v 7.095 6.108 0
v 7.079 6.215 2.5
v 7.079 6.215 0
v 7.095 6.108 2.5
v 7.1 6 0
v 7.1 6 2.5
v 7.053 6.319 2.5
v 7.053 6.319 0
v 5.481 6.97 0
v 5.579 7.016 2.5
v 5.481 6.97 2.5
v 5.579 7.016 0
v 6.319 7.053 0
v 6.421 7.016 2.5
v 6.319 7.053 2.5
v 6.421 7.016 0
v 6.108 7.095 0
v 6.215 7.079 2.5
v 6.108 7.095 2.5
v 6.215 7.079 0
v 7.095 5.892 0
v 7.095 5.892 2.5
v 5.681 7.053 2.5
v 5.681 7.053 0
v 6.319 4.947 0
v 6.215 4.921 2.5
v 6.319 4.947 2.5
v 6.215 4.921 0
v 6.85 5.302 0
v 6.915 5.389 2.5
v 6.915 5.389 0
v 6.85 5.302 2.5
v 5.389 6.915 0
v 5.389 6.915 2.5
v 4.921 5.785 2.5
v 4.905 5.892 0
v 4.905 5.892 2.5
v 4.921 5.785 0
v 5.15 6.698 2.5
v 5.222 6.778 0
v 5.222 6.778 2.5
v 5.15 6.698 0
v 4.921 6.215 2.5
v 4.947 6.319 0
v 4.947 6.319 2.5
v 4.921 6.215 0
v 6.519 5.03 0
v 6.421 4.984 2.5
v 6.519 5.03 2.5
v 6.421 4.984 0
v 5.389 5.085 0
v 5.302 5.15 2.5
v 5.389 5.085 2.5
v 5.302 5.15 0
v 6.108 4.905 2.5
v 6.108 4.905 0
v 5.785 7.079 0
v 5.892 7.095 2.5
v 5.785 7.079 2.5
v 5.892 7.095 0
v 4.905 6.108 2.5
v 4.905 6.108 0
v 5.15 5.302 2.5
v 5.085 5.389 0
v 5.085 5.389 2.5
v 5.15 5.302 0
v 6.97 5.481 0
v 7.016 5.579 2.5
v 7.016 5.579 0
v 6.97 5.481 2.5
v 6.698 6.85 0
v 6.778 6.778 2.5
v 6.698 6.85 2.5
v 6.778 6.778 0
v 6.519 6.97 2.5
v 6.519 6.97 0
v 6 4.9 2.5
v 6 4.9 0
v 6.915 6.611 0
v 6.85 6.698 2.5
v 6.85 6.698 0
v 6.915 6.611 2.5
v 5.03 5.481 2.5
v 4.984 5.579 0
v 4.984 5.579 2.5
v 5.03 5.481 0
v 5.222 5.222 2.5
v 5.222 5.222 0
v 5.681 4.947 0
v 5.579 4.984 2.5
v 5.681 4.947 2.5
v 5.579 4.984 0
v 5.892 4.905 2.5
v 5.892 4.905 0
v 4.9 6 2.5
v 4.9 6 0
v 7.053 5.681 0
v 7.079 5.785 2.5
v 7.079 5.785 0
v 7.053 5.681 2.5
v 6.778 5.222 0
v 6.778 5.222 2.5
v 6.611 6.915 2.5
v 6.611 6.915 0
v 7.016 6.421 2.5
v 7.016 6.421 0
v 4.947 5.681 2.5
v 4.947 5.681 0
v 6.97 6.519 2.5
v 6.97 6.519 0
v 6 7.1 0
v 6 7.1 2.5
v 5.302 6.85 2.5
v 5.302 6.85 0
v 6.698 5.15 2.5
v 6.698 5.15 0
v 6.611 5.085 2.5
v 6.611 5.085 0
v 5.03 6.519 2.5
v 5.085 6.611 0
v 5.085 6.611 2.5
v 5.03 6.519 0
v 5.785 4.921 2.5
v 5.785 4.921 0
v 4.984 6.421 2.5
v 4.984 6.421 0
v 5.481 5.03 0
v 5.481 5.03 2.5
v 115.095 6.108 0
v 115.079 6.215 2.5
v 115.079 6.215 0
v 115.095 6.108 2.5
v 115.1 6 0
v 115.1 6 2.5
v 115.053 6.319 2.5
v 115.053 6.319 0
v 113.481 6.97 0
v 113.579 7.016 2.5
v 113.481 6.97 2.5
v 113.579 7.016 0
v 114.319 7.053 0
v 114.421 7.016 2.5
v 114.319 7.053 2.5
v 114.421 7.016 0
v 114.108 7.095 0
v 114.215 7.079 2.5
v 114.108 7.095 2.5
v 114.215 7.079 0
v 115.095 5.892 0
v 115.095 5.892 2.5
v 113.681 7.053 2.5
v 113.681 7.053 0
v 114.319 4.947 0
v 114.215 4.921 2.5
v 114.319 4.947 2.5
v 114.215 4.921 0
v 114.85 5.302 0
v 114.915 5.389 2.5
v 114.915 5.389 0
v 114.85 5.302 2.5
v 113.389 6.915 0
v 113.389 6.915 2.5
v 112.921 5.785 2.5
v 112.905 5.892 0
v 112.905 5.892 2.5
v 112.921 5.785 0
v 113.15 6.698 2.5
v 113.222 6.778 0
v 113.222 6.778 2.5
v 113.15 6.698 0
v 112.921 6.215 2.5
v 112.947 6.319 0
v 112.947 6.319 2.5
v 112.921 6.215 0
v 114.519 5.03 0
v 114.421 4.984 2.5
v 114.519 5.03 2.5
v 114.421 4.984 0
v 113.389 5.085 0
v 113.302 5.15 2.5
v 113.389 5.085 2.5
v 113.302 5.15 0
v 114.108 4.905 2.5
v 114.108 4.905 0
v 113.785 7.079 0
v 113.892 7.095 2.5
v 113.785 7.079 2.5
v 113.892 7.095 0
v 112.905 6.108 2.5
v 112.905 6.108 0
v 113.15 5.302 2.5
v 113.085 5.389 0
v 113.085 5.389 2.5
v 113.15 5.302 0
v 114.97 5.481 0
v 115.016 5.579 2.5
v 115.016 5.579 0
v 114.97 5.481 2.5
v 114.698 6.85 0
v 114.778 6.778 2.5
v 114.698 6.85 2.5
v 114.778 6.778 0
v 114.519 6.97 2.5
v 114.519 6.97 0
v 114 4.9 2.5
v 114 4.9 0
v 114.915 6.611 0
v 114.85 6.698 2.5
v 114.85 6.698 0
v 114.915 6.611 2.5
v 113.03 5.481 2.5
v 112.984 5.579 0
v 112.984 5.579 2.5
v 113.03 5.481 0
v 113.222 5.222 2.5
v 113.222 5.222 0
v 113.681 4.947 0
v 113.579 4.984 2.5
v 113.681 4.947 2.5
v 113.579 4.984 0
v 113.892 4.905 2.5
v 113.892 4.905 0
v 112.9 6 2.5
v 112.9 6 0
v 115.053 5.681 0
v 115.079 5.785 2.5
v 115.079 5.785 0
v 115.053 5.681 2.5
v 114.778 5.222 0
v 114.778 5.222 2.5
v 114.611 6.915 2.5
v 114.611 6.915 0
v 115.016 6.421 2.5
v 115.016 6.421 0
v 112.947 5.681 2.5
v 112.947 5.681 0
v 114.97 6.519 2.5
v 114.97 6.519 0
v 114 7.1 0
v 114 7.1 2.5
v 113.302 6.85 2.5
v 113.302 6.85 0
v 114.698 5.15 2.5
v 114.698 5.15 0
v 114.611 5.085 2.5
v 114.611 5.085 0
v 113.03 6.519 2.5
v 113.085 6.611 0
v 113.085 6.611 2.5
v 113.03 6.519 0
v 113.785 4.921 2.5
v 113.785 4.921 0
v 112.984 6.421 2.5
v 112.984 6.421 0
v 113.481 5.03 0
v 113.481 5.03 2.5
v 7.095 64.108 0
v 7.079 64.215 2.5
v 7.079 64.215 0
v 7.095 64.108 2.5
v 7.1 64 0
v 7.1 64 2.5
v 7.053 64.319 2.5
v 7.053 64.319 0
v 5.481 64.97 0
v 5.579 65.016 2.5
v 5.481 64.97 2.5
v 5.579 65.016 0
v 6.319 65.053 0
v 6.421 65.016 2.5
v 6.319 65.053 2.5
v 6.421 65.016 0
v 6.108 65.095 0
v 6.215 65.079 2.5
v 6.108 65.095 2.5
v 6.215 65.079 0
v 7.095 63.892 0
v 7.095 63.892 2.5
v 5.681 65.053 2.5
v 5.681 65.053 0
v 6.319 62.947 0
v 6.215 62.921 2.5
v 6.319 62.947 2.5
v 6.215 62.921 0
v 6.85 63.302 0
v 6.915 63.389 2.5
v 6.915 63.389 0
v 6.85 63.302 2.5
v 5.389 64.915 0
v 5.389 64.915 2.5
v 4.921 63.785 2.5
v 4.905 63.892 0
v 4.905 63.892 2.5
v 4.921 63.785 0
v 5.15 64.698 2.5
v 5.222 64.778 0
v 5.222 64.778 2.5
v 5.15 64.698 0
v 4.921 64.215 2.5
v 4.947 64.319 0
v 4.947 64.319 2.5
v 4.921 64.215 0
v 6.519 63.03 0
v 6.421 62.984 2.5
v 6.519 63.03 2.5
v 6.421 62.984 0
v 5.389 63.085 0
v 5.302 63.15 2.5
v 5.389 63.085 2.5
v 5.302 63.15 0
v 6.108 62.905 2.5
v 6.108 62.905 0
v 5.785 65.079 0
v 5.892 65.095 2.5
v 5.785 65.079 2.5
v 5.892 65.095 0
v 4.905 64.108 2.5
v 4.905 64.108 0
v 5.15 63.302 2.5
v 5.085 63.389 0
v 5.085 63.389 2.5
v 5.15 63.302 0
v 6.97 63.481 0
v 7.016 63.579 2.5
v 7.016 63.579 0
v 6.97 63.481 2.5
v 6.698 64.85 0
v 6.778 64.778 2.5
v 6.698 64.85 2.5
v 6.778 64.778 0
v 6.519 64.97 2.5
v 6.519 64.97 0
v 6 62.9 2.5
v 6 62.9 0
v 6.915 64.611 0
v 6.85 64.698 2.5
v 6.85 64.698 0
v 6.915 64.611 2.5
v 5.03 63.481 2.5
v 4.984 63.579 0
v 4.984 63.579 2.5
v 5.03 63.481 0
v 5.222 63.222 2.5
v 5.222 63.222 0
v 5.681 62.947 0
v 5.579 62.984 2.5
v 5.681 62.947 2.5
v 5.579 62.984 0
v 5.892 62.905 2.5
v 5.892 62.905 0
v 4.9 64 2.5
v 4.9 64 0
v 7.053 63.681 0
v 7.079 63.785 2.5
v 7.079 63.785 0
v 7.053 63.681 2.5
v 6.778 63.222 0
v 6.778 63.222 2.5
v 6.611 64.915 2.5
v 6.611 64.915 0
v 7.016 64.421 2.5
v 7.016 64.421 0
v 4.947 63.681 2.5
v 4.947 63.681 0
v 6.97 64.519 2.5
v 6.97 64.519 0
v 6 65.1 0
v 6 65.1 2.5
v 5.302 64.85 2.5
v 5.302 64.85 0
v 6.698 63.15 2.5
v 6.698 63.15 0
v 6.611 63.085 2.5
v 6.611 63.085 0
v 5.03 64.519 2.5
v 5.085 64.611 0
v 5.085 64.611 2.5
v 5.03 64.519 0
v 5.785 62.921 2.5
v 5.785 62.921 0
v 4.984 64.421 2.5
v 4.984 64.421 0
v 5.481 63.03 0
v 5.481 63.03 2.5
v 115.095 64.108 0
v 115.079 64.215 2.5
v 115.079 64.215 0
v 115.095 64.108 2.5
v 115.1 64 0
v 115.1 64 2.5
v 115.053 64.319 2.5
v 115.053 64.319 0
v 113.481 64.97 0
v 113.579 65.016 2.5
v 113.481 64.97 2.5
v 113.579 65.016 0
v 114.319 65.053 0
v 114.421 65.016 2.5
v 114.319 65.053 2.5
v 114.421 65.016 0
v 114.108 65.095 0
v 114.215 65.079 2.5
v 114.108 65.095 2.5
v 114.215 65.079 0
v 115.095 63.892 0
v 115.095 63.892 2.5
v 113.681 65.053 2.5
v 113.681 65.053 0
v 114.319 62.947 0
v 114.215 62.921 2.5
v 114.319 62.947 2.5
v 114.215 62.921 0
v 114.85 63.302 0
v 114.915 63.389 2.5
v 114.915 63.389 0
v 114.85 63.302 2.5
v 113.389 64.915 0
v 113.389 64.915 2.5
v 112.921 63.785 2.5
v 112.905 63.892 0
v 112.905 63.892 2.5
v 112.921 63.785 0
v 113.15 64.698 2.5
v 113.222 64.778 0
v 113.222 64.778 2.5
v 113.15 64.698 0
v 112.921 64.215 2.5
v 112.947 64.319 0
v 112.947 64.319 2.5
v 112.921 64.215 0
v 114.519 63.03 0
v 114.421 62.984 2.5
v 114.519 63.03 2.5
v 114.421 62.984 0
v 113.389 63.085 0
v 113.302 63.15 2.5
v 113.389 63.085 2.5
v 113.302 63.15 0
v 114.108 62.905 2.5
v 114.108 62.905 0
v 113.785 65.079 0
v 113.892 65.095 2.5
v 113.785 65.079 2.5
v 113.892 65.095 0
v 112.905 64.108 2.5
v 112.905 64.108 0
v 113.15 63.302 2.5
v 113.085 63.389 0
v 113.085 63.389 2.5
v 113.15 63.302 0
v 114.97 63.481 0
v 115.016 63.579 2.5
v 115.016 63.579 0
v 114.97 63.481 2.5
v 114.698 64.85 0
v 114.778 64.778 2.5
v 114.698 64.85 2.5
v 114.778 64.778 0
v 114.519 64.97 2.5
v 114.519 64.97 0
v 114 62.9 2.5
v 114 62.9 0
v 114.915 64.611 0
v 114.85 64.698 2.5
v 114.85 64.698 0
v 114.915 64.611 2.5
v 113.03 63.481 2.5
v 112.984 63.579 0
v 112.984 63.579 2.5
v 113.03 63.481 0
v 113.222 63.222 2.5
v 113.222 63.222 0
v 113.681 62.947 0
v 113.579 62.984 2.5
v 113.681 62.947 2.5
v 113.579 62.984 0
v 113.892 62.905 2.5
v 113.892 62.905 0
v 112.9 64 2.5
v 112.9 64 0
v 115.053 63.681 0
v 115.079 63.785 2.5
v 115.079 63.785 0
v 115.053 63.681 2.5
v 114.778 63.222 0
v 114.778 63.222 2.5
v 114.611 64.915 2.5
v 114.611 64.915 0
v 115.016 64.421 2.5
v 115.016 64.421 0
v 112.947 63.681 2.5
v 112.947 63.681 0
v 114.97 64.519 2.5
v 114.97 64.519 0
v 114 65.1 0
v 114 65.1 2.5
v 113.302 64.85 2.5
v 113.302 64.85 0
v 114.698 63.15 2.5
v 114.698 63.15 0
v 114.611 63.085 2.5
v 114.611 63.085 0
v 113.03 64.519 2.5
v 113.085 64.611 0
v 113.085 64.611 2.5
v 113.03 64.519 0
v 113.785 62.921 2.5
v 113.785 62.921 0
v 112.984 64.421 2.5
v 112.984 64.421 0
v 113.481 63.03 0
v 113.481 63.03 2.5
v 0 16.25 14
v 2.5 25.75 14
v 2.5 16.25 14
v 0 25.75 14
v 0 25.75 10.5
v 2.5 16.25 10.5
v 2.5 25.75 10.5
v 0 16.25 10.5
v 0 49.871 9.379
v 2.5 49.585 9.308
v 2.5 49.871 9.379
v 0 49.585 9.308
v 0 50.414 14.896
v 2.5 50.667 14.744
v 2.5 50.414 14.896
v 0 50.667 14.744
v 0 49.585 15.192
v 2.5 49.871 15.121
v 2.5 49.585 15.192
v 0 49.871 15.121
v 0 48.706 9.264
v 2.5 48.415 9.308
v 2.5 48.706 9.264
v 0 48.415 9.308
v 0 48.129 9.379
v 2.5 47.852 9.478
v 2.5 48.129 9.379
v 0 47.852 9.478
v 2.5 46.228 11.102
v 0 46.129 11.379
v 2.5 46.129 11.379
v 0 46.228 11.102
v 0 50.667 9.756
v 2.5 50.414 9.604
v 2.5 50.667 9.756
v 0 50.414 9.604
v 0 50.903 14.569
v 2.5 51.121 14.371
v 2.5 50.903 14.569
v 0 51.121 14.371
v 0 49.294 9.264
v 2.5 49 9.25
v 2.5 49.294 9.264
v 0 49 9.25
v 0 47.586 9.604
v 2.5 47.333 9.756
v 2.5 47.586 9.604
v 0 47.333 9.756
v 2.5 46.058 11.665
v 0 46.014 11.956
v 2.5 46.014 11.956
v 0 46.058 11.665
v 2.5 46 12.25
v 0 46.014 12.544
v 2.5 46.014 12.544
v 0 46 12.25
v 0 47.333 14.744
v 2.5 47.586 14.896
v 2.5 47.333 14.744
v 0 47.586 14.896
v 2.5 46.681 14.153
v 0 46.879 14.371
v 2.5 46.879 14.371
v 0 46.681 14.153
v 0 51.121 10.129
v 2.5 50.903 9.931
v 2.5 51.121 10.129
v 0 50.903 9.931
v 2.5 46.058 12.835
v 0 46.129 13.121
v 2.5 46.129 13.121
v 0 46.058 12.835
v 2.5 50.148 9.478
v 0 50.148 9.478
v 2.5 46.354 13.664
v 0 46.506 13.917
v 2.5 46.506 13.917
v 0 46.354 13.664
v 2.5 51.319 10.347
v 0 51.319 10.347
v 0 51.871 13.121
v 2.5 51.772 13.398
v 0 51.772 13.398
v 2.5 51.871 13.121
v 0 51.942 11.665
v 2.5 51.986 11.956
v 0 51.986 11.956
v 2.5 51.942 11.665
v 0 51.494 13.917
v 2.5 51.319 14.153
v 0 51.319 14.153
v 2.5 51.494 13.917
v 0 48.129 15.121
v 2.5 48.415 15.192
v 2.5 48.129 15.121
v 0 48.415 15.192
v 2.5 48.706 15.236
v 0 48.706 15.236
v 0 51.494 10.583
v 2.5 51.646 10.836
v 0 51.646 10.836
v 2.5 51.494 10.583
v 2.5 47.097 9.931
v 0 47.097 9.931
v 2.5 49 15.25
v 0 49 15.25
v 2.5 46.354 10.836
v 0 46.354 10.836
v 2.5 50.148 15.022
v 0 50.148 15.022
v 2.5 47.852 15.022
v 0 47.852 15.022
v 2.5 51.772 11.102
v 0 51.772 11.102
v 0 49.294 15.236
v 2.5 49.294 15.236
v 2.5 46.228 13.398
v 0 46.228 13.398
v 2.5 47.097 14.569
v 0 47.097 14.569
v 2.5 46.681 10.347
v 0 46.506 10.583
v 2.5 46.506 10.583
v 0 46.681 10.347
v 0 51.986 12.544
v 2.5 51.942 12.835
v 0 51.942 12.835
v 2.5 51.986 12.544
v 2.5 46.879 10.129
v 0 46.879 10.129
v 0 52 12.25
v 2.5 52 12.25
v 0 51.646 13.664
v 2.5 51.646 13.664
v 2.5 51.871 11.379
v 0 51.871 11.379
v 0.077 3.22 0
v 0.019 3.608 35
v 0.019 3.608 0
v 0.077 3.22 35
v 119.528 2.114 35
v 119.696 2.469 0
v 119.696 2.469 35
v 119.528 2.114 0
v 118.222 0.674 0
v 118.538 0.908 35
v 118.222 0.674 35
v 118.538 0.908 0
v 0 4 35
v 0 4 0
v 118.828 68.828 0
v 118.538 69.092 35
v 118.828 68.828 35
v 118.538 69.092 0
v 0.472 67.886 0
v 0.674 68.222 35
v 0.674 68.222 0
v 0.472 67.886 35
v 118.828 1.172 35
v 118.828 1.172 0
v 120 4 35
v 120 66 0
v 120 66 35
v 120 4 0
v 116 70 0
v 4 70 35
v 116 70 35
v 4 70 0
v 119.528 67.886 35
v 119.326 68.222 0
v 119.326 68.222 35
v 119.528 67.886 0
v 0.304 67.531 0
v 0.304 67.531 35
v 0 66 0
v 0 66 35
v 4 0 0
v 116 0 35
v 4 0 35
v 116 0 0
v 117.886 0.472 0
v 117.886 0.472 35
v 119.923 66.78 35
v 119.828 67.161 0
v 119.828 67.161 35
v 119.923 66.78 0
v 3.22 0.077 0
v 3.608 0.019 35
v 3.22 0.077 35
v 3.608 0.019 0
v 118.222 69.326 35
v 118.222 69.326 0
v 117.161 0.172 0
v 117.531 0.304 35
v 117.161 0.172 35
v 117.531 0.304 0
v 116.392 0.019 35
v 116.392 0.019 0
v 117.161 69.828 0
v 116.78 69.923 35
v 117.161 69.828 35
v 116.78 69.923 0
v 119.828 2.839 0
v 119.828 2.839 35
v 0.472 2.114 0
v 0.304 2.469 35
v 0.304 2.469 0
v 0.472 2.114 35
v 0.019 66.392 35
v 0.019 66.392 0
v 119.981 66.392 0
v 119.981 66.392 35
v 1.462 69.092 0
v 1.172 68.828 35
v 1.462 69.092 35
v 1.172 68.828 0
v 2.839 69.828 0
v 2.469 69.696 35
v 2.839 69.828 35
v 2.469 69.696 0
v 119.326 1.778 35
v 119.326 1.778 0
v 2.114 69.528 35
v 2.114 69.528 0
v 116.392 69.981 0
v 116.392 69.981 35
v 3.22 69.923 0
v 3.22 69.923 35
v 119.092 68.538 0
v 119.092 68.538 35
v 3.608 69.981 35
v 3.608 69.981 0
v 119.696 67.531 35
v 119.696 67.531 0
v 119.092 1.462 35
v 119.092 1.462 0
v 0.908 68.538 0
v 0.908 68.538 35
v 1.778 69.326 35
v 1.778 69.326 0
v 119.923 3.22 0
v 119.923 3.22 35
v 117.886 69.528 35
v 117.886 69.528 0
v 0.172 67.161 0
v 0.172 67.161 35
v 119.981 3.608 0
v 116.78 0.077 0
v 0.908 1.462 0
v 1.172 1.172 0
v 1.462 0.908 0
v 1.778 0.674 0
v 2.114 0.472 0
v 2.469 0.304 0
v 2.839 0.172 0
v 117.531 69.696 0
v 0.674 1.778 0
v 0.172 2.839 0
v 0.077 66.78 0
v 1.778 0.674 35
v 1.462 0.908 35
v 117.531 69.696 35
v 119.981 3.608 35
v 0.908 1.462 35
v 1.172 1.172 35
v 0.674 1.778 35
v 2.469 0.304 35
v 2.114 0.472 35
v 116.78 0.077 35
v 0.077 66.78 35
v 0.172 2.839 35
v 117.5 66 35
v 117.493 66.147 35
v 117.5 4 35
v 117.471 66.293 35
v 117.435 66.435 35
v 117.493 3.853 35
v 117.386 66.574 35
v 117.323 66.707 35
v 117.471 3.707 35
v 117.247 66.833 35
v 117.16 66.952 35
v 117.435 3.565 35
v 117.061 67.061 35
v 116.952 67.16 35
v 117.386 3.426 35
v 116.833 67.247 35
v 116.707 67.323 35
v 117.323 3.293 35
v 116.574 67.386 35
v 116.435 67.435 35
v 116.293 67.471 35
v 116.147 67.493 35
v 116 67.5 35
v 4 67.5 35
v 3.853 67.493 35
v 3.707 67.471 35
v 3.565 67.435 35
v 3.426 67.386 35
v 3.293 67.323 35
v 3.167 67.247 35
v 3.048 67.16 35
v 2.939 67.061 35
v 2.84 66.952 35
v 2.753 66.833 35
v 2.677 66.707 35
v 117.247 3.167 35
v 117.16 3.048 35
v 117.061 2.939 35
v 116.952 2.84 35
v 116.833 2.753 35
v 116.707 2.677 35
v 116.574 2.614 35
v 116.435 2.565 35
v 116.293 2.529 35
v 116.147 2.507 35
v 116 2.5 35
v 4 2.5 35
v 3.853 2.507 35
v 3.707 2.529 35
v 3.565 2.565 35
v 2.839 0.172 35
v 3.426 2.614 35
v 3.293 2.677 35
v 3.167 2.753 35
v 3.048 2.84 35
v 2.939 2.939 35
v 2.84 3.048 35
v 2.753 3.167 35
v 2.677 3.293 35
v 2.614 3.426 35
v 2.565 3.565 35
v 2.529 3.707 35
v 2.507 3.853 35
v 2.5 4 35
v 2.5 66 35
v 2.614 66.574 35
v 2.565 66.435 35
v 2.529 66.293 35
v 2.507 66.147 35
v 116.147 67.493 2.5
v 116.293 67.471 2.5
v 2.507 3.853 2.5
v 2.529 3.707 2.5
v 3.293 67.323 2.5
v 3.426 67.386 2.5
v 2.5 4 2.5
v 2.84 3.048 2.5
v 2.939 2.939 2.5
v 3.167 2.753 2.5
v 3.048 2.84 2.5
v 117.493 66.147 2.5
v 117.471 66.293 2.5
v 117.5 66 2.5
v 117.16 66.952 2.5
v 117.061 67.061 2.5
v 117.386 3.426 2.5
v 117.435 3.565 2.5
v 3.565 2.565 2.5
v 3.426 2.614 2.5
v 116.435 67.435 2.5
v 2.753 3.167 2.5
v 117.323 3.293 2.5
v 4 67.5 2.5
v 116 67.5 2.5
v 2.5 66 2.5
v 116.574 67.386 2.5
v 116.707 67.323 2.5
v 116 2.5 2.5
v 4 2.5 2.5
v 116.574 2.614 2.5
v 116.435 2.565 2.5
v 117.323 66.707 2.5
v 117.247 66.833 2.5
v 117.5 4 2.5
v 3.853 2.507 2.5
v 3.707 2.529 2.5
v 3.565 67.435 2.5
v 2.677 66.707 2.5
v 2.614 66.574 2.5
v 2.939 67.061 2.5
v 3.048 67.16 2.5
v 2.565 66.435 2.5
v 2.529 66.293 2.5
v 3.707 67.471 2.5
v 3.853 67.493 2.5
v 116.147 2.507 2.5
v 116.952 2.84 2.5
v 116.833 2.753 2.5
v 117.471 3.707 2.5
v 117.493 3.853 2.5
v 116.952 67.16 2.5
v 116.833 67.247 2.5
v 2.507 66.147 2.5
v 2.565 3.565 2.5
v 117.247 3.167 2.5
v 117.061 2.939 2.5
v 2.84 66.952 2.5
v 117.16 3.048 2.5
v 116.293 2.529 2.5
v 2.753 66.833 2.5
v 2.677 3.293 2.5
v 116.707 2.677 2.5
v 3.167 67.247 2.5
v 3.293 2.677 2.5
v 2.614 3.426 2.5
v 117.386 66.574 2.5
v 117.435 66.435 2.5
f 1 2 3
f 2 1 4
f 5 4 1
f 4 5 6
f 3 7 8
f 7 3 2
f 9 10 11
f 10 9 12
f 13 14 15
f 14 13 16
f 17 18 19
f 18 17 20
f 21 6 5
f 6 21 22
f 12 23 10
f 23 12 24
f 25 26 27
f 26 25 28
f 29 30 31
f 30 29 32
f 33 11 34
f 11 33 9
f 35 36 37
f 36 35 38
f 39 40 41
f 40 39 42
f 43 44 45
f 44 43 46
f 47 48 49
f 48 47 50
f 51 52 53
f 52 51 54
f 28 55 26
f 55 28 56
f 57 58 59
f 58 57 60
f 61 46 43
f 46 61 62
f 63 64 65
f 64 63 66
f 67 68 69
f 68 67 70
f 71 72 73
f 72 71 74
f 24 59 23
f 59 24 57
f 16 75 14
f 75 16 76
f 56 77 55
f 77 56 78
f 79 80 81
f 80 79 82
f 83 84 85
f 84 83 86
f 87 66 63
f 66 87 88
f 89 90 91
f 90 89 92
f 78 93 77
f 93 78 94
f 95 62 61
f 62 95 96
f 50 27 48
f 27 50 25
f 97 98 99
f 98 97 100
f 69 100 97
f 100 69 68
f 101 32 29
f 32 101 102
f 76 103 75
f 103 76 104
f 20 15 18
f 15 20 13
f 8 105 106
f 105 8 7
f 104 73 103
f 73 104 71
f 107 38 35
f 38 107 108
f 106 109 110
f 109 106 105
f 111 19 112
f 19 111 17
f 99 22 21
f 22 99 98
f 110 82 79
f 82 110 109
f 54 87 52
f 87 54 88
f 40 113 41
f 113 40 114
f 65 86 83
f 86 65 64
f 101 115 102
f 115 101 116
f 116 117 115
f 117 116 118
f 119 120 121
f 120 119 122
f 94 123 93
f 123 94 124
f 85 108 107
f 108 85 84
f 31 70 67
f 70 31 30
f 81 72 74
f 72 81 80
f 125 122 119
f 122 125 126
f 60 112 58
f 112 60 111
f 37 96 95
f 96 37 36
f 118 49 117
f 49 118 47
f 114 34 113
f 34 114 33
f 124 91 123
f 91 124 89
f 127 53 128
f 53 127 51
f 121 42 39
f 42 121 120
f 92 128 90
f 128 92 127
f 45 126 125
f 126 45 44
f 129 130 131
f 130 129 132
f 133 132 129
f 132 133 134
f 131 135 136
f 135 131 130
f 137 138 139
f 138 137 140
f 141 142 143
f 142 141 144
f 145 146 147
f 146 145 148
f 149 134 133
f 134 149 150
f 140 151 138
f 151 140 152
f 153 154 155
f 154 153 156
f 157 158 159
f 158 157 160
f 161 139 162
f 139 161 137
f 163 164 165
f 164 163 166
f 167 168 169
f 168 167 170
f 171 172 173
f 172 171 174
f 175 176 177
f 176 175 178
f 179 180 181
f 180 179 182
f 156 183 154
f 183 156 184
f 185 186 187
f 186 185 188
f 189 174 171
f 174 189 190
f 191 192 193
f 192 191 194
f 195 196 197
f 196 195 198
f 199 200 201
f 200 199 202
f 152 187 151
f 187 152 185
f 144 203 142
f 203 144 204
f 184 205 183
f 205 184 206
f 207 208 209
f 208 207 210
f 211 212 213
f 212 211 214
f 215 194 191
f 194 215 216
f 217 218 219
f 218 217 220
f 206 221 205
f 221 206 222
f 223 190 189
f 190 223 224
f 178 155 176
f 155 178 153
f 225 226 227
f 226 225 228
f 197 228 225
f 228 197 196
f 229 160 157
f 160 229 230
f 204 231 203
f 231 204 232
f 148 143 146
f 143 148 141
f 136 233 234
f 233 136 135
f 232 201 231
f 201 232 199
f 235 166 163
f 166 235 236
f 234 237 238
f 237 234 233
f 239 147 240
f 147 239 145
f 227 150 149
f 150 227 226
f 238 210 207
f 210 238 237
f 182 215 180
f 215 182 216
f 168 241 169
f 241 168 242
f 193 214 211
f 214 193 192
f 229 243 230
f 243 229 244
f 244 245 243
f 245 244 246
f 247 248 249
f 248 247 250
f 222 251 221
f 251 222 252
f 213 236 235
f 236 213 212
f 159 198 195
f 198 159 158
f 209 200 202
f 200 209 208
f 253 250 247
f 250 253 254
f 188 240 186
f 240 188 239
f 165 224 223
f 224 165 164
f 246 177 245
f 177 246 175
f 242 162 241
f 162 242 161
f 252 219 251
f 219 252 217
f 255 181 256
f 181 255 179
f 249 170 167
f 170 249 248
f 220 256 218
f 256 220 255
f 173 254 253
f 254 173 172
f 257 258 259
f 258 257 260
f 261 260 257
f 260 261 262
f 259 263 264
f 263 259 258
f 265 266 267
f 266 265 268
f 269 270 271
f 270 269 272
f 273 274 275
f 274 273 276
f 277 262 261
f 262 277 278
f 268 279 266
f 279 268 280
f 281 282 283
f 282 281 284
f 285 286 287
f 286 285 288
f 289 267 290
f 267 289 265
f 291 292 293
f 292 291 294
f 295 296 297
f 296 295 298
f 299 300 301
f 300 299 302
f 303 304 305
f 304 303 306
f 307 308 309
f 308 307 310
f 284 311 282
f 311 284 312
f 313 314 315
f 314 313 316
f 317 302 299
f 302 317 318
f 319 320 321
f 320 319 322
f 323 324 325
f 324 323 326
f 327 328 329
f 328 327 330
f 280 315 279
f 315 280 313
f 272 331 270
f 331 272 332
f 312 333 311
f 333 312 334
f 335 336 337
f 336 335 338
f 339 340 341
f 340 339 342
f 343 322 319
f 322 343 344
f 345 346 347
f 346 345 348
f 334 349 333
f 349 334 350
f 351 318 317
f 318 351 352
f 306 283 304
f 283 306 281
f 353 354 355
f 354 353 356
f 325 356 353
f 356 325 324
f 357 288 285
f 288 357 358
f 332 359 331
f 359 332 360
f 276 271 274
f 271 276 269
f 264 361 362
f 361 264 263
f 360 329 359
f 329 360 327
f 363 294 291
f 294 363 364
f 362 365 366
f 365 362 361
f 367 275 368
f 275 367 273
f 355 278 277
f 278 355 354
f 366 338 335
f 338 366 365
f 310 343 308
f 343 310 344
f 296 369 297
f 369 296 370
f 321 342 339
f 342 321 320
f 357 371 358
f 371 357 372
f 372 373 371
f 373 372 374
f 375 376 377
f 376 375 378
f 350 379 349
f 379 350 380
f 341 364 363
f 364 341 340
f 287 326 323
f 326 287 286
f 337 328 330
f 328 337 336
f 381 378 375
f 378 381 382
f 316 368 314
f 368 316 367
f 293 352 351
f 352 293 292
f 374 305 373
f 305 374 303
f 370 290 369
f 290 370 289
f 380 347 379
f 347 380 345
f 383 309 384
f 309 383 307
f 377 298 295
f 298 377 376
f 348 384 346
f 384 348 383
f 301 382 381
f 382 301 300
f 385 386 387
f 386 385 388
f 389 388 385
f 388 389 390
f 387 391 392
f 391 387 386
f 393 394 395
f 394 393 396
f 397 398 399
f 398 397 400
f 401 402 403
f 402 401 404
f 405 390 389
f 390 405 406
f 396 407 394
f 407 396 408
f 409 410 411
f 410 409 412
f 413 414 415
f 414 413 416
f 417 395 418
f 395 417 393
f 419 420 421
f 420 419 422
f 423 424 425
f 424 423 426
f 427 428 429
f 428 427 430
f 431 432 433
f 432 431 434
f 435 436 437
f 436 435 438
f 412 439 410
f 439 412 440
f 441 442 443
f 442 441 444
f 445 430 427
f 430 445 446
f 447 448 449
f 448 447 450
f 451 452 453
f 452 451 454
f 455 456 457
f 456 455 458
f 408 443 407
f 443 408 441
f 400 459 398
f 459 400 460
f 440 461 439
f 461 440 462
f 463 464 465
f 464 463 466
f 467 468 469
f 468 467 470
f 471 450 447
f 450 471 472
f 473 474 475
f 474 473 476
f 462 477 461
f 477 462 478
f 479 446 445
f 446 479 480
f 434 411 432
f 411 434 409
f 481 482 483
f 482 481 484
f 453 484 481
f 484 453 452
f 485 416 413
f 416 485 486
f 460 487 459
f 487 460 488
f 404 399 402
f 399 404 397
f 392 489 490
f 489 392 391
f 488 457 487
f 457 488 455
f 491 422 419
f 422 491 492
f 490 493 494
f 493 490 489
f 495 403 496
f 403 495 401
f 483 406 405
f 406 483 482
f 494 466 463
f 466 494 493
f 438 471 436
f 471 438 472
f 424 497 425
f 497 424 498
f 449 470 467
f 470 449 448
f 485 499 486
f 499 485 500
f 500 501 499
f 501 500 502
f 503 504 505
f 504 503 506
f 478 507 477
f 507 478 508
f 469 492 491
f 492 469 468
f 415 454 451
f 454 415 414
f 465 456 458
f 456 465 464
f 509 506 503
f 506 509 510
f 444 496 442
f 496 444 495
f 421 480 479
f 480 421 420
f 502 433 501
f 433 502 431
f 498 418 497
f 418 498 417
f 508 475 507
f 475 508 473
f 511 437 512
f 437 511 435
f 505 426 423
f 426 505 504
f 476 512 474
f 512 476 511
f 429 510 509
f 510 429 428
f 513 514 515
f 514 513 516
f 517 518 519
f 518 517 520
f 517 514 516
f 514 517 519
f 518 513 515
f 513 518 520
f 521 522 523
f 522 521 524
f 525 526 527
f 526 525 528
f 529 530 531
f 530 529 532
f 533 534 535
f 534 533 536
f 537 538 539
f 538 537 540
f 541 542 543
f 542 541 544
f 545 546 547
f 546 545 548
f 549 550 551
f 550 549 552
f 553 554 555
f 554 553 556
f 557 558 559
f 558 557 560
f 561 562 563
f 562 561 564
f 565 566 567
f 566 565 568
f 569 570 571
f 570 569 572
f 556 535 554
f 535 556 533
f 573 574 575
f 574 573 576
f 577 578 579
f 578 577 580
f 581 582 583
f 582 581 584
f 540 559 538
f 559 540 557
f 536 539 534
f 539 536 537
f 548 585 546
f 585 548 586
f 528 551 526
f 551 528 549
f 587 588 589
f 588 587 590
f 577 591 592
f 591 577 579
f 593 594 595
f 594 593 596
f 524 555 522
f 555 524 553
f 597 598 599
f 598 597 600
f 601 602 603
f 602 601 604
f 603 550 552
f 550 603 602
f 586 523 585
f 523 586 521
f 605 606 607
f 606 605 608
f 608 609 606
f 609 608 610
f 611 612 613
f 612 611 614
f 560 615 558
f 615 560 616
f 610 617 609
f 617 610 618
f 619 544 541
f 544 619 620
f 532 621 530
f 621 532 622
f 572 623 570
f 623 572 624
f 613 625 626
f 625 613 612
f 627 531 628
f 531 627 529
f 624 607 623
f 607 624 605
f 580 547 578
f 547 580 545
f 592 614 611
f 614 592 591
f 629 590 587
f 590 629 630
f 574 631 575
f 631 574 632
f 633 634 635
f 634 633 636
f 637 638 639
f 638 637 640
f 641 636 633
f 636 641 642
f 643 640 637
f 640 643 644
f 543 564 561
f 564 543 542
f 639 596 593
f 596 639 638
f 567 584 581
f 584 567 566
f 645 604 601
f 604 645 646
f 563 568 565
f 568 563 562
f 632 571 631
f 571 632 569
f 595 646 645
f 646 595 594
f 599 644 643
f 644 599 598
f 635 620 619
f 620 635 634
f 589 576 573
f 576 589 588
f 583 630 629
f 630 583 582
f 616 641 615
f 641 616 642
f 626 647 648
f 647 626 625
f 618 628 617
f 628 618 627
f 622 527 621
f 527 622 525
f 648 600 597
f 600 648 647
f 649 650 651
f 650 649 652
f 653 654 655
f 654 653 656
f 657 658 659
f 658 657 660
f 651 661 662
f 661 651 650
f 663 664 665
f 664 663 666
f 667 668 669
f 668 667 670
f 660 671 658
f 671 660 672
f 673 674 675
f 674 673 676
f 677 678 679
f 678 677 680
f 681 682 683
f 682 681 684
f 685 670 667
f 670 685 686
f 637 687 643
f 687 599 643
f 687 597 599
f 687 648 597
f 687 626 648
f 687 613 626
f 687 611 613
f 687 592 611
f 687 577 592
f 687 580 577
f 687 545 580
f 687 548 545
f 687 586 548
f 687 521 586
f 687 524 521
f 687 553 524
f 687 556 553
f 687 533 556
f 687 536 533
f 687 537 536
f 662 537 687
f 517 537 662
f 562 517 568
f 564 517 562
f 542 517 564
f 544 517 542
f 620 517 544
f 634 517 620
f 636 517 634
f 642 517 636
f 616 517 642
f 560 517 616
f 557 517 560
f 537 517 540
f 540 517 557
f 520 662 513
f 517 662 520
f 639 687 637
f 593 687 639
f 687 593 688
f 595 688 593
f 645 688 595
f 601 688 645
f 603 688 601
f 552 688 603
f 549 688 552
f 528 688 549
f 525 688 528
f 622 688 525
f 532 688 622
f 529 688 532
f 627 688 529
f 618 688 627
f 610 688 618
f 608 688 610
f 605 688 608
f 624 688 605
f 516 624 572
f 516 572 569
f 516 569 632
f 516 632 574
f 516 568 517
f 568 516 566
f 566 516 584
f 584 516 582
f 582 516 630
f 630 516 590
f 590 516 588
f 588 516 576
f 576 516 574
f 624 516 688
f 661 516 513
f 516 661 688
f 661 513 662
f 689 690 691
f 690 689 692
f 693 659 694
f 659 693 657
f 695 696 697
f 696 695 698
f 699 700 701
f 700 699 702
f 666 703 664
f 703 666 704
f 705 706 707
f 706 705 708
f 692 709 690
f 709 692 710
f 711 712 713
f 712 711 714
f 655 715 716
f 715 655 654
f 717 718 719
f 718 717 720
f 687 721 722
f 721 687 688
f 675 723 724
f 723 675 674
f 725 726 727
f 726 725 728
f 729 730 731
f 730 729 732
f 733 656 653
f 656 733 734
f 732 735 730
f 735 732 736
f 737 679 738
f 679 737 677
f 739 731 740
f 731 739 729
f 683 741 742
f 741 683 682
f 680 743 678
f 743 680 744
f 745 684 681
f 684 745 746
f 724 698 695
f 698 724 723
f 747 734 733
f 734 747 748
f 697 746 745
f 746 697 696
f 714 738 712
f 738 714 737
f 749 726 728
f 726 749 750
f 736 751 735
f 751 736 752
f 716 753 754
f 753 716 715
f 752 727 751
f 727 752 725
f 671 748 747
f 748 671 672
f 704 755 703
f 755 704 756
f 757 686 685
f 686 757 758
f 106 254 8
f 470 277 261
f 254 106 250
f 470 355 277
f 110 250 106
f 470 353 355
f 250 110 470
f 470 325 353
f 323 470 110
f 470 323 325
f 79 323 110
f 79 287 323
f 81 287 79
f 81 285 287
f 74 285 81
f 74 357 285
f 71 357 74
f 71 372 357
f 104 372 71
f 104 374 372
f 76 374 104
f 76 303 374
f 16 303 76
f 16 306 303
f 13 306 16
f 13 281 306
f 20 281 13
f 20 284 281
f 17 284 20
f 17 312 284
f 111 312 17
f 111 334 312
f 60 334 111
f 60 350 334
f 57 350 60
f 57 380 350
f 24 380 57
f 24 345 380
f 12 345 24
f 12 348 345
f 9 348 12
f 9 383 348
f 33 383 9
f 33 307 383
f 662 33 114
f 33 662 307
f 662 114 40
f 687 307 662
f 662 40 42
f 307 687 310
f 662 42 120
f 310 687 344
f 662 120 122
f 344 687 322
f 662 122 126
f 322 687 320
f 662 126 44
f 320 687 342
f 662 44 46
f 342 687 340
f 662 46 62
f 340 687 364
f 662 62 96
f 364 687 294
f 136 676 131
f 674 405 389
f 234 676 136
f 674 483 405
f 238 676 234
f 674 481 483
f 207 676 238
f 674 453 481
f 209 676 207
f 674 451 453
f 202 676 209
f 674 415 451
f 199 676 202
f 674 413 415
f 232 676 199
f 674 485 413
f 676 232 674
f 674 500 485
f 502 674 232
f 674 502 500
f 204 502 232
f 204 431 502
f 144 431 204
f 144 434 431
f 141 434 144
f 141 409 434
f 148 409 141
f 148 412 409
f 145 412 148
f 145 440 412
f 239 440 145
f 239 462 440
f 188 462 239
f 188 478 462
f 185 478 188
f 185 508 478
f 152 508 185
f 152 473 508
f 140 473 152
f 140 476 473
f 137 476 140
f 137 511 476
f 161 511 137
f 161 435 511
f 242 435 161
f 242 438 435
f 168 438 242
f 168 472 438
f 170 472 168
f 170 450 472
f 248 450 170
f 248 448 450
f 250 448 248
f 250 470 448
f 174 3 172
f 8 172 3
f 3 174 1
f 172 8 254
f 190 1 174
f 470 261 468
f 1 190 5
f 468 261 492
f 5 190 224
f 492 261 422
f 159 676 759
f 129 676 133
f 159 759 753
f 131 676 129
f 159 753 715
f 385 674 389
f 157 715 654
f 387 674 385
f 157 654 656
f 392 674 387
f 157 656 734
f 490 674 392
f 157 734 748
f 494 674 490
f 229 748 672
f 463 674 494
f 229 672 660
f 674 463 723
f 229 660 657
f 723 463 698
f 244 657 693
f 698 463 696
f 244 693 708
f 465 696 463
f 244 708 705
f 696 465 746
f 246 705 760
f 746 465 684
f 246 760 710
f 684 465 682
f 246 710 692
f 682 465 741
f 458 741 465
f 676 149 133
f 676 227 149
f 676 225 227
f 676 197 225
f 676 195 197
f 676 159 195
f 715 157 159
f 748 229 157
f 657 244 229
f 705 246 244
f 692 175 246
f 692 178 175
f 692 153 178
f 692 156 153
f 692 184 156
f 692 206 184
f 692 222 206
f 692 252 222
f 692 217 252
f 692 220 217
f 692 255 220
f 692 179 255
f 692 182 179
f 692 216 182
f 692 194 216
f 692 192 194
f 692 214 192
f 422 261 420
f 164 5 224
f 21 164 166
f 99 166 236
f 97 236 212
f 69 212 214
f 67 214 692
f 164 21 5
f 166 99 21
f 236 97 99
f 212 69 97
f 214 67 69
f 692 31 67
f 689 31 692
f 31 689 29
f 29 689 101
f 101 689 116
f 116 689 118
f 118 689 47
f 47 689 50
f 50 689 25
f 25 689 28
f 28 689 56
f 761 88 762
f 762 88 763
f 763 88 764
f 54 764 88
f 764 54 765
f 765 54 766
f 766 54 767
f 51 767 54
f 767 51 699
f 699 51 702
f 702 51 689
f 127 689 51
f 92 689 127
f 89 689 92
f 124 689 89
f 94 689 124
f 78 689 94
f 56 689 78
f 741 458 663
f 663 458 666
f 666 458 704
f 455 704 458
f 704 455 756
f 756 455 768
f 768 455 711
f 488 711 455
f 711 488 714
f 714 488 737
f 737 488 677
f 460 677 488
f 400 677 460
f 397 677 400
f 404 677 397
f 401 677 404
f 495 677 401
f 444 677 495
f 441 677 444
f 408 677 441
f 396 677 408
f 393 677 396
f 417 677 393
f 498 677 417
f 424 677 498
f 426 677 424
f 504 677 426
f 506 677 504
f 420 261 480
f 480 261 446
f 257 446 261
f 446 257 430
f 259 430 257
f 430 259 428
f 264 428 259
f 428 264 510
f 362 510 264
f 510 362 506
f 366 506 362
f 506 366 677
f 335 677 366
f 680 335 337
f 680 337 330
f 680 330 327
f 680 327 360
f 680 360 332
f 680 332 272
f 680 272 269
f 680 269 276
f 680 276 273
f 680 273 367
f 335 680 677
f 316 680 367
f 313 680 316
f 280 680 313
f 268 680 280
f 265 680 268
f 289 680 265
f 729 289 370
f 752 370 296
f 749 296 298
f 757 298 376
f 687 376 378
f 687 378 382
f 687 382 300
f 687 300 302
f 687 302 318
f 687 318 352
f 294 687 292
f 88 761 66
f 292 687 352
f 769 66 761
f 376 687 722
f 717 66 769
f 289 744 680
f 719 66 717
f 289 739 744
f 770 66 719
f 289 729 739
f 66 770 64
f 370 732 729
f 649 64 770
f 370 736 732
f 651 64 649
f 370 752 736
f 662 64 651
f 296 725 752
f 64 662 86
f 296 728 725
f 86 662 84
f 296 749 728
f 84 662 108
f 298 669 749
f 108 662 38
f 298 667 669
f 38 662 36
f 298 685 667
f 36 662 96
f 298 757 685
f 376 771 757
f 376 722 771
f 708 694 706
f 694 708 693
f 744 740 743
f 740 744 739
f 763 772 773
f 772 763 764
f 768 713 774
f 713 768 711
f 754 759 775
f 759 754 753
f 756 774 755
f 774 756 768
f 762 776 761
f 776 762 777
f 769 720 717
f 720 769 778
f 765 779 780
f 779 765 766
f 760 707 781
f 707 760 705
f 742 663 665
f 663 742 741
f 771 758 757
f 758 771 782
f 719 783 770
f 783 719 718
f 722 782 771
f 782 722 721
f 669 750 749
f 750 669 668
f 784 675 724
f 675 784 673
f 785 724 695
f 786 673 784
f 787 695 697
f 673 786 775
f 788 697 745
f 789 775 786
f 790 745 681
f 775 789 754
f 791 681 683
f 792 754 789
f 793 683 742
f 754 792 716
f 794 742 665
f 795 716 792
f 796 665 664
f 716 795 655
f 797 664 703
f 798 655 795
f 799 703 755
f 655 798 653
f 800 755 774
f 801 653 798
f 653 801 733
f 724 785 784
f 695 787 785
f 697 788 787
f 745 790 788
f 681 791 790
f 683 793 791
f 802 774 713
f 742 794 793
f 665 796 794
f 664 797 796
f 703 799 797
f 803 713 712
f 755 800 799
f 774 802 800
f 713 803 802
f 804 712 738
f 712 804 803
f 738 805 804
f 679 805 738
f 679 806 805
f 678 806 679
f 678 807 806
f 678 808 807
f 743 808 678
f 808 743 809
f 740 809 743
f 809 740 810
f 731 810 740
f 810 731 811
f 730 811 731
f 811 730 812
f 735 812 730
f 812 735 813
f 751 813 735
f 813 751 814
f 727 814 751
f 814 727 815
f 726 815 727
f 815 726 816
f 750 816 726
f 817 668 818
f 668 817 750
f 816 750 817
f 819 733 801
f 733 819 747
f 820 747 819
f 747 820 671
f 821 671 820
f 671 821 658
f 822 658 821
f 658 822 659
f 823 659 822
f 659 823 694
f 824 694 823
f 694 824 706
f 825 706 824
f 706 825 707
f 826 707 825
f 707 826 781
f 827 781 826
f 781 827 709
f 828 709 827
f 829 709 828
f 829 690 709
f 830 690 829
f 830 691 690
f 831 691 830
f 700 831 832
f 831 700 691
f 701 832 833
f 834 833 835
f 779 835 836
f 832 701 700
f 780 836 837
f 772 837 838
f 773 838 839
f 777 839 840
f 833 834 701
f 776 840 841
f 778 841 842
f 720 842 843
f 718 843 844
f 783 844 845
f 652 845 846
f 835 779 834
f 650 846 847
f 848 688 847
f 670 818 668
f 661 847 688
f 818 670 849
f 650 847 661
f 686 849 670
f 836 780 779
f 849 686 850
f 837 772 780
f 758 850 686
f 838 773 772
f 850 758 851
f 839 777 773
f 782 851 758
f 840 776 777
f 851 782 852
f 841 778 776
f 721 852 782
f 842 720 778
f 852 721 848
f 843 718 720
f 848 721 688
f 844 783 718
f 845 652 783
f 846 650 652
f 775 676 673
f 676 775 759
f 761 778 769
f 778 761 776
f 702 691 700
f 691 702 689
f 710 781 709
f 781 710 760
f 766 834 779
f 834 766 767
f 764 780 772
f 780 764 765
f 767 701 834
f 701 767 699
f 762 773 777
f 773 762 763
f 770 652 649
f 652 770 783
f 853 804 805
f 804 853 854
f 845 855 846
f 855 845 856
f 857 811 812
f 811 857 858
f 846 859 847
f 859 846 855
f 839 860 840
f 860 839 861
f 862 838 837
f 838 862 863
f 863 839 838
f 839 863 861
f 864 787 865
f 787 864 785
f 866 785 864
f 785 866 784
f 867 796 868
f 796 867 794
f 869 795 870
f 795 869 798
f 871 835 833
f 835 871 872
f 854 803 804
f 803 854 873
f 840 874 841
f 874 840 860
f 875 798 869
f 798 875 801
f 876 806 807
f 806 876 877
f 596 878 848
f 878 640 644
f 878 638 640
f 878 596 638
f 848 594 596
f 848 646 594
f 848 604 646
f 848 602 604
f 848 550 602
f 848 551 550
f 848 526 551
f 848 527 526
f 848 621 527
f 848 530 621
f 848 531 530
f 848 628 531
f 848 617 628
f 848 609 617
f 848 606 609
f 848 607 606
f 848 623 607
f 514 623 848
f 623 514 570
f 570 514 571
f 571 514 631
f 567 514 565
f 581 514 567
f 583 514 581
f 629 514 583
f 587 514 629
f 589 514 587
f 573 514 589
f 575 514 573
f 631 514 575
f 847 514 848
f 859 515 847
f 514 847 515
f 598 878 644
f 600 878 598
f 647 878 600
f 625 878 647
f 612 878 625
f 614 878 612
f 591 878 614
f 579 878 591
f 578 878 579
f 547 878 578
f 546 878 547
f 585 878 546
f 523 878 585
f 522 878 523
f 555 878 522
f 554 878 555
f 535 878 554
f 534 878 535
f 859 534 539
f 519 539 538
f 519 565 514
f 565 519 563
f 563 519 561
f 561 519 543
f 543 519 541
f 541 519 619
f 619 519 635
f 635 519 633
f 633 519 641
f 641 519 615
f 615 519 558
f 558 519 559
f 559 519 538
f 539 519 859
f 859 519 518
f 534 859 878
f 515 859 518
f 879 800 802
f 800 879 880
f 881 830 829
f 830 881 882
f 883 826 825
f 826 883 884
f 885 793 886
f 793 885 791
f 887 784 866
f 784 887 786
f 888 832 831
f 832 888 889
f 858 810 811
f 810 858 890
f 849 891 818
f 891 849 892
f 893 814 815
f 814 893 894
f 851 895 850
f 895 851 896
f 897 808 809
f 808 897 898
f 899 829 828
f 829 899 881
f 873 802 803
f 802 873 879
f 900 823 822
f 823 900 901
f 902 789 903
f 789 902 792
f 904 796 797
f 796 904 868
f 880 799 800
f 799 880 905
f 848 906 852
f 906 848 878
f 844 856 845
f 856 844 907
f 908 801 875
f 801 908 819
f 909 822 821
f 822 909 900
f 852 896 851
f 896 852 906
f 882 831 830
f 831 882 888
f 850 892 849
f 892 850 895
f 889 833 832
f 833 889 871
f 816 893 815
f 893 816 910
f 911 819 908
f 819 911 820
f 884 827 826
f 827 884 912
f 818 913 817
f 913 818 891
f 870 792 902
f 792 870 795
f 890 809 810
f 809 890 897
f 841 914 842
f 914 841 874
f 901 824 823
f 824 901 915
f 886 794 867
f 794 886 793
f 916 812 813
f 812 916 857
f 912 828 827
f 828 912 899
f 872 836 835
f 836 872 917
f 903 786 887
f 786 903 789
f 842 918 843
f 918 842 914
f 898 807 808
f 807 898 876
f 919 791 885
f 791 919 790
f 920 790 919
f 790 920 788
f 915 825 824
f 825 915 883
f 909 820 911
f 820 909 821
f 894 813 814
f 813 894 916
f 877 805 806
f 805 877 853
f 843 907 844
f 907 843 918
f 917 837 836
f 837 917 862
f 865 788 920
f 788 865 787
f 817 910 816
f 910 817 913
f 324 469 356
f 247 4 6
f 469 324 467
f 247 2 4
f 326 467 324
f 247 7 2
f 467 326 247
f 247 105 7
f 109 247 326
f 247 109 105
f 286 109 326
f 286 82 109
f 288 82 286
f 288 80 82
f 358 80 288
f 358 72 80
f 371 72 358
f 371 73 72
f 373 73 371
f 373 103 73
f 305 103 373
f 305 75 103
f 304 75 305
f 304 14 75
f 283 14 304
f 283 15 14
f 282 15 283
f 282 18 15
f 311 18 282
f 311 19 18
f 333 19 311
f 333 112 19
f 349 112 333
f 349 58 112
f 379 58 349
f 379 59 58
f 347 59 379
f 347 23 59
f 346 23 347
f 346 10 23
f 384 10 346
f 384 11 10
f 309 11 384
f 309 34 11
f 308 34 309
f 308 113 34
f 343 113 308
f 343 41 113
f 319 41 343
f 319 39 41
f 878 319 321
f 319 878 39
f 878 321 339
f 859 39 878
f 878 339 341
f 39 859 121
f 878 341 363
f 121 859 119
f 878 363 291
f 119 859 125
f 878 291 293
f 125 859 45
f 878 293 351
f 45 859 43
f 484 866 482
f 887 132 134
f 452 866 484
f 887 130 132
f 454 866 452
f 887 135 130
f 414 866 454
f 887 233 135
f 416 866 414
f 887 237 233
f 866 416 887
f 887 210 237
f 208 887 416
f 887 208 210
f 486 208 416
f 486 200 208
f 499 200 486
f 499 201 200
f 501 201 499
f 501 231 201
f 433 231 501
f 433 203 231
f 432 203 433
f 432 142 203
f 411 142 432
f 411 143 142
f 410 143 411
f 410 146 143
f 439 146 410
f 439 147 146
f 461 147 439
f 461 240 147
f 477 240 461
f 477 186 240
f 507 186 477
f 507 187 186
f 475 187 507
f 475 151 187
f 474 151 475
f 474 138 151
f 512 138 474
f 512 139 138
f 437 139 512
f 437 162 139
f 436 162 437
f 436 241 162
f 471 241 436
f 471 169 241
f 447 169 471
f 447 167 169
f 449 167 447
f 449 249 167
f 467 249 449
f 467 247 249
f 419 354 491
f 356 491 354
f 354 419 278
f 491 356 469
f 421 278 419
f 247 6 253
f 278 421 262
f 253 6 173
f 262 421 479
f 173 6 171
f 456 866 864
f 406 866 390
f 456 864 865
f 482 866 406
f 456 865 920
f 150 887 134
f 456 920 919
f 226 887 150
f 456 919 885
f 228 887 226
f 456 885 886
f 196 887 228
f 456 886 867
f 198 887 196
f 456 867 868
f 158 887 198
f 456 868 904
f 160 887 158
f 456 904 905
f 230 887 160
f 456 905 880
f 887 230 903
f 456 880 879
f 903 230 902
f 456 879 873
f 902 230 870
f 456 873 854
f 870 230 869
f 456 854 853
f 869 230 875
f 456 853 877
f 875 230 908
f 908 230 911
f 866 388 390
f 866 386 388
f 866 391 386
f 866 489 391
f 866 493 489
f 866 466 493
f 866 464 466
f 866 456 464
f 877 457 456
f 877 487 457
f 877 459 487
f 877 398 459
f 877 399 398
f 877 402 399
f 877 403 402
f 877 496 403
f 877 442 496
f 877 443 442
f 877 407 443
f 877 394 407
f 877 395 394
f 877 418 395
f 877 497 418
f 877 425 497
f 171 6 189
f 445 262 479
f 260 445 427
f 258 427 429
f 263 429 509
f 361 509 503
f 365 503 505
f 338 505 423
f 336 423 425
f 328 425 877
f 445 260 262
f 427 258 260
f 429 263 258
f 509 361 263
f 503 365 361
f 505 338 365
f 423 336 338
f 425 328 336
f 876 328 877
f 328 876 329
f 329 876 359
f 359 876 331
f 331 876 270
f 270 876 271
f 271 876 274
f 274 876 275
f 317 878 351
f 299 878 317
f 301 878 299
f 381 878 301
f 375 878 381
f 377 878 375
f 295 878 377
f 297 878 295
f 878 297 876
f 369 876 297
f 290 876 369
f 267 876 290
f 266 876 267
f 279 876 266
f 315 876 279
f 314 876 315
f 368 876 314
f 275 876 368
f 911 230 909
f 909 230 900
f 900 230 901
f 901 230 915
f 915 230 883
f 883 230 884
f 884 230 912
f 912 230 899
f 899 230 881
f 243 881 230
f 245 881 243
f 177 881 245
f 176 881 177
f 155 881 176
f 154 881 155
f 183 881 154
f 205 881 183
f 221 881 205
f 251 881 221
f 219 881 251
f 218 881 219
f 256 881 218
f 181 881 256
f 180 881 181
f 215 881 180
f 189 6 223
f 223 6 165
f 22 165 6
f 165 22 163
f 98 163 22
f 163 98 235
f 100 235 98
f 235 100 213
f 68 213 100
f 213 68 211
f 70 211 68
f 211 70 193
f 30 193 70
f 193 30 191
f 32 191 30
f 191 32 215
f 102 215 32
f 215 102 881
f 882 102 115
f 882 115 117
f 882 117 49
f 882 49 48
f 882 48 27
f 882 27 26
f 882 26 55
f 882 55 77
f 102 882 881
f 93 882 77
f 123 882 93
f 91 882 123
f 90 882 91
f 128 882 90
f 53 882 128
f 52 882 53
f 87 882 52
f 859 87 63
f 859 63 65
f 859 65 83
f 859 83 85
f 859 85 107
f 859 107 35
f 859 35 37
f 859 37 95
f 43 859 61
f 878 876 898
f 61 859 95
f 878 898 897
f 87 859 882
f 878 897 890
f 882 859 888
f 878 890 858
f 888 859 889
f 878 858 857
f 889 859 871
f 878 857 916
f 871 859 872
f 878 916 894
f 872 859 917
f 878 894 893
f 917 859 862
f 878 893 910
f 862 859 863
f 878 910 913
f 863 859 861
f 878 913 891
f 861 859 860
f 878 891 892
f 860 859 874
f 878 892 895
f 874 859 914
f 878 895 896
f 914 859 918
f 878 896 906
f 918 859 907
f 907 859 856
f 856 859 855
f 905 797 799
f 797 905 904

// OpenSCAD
// ============================================================
// Smart Tourniquet System — Casing Smart Module
// Kelompok 19 — Desain Proyek Teknik Elektro, Komputer, Biomedik 2
//
// Dimensi luar: 120mm x 70mm x 35mm, ABS + gasket silikon IP54
// Cara pakai: buka di OpenSCAD (openscad.org), F6 untuk render,
// File > Export > Export as STL untuk cetak 3D.
// ============================================================

$fn = 64;

case_l = 120; case_w = 70; case_h = 35;
wall_t = 2.5; corner_r = 4;

gasket_groove_w = 3.2; gasket_groove_d = 1.5; gasket_groove_offset = 3;
screw_d = 2.2; screw_head_d = 4.2; screw_inset = 6;

oled_w = 30; oled_h = 14;
oled_pos = [case_l*0.28, case_w/2, 0];
btn_d = 8;
btn_pwr_pos  = [case_l*0.62, case_w*0.30, 0];
btn_start_pos= [case_l*0.62, case_w*0.70, 0];
led_d = 5; led_spacing = 10;
led_center_pos = [case_l*0.80, case_w/2, 0];
usb_c_w = 9.5; usb_c_h = 3.5;
usb_c_pos = [0, case_w*0.30, case_h*0.35];
pneumatic_port_d = 6;
pneumatic_port_pos = [0, case_w*0.70, case_h*0.35];
buzzer_d = 8;
buzzer_pos = [case_l*0.15, case_w/2, 0];

module rounded_rect(l, w, r) {
    hull() { for (x=[r,l-r]) for (y=[r,w-r]) translate([x,y,0]) circle(r=r); }
}
module case_shell_outer() { linear_extrude(height=case_h) rounded_rect(case_l, case_w, corner_r); }
module case_shell_inner() {
    translate([wall_t, wall_t, wall_t])
        linear_extrude(height=case_h)
            rounded_rect(case_l-2*wall_t, case_w-2*wall_t, max(corner_r-wall_t, 0.5));
}
module gasket_groove() {
    translate([gasket_groove_offset, gasket_groove_offset, case_h-gasket_groove_d])
        linear_extrude(height=gasket_groove_d+0.1)
            difference() {
                rounded_rect(case_l-2*gasket_groove_offset, case_w-2*gasket_groove_offset, corner_r);
                offset(delta=-gasket_groove_w)
                    rounded_rect(case_l-2*gasket_groove_offset, case_w-2*gasket_groove_offset, corner_r);
            }
}
module screw_hole(pos) {
    translate(pos) union() {
        cylinder(h=case_h+2, d=screw_d);
        translate([0,0,case_h-3]) cylinder(h=3.1, d1=screw_d, d2=screw_head_d);
    }
}
module screw_holes_all_corners() {
    for (p = [[screw_inset,screw_inset,-1],[case_l-screw_inset,screw_inset,-1],
              [screw_inset,case_w-screw_inset,-1],[case_l-screw_inset,case_w-screw_inset,-1]])
        screw_hole(p);
}
module top_panel_cutouts() {
    translate([oled_pos[0]-oled_w/2, oled_pos[1]-oled_h/2, case_h-wall_t-0.1])
        cube([oled_w, oled_h, wall_t+0.2]);
    translate([btn_pwr_pos[0], btn_pwr_pos[1], case_h-wall_t-0.1]) cylinder(h=wall_t+0.2, d=btn_d);
    translate([btn_start_pos[0], btn_start_pos[1], case_h-wall_t-0.1]) cylinder(h=wall_t+0.2, d=btn_d);
    for (i=[-1,0,1])
        translate([led_center_pos[0]+i*led_spacing, led_center_pos[1], case_h-wall_t-0.1])
            cylinder(h=wall_t+0.2, d=led_d);
    translate([buzzer_pos[0], buzzer_pos[1], case_h-wall_t-0.1]) cylinder(h=wall_t+0.2, d=buzzer_d);
}
module side_panel_cutouts() {
    translate([-0.1, usb_c_pos[1]-usb_c_w/2, usb_c_pos[2]-usb_c_h/2]) cube([wall_t+0.2, usb_c_w, usb_c_h]);
    translate([-0.1, pneumatic_port_pos[1], pneumatic_port_pos[2]])
        rotate([0,90,0]) cylinder(h=wall_t+0.2, d=pneumatic_port_d);
}
module smart_module_case() {
    difference() {
        case_shell_outer();
        case_shell_inner();
        gasket_groove();
        screw_holes_all_corners();
        top_panel_cutouts();
        side_panel_cutouts();
    }
}
smart_module_case();
